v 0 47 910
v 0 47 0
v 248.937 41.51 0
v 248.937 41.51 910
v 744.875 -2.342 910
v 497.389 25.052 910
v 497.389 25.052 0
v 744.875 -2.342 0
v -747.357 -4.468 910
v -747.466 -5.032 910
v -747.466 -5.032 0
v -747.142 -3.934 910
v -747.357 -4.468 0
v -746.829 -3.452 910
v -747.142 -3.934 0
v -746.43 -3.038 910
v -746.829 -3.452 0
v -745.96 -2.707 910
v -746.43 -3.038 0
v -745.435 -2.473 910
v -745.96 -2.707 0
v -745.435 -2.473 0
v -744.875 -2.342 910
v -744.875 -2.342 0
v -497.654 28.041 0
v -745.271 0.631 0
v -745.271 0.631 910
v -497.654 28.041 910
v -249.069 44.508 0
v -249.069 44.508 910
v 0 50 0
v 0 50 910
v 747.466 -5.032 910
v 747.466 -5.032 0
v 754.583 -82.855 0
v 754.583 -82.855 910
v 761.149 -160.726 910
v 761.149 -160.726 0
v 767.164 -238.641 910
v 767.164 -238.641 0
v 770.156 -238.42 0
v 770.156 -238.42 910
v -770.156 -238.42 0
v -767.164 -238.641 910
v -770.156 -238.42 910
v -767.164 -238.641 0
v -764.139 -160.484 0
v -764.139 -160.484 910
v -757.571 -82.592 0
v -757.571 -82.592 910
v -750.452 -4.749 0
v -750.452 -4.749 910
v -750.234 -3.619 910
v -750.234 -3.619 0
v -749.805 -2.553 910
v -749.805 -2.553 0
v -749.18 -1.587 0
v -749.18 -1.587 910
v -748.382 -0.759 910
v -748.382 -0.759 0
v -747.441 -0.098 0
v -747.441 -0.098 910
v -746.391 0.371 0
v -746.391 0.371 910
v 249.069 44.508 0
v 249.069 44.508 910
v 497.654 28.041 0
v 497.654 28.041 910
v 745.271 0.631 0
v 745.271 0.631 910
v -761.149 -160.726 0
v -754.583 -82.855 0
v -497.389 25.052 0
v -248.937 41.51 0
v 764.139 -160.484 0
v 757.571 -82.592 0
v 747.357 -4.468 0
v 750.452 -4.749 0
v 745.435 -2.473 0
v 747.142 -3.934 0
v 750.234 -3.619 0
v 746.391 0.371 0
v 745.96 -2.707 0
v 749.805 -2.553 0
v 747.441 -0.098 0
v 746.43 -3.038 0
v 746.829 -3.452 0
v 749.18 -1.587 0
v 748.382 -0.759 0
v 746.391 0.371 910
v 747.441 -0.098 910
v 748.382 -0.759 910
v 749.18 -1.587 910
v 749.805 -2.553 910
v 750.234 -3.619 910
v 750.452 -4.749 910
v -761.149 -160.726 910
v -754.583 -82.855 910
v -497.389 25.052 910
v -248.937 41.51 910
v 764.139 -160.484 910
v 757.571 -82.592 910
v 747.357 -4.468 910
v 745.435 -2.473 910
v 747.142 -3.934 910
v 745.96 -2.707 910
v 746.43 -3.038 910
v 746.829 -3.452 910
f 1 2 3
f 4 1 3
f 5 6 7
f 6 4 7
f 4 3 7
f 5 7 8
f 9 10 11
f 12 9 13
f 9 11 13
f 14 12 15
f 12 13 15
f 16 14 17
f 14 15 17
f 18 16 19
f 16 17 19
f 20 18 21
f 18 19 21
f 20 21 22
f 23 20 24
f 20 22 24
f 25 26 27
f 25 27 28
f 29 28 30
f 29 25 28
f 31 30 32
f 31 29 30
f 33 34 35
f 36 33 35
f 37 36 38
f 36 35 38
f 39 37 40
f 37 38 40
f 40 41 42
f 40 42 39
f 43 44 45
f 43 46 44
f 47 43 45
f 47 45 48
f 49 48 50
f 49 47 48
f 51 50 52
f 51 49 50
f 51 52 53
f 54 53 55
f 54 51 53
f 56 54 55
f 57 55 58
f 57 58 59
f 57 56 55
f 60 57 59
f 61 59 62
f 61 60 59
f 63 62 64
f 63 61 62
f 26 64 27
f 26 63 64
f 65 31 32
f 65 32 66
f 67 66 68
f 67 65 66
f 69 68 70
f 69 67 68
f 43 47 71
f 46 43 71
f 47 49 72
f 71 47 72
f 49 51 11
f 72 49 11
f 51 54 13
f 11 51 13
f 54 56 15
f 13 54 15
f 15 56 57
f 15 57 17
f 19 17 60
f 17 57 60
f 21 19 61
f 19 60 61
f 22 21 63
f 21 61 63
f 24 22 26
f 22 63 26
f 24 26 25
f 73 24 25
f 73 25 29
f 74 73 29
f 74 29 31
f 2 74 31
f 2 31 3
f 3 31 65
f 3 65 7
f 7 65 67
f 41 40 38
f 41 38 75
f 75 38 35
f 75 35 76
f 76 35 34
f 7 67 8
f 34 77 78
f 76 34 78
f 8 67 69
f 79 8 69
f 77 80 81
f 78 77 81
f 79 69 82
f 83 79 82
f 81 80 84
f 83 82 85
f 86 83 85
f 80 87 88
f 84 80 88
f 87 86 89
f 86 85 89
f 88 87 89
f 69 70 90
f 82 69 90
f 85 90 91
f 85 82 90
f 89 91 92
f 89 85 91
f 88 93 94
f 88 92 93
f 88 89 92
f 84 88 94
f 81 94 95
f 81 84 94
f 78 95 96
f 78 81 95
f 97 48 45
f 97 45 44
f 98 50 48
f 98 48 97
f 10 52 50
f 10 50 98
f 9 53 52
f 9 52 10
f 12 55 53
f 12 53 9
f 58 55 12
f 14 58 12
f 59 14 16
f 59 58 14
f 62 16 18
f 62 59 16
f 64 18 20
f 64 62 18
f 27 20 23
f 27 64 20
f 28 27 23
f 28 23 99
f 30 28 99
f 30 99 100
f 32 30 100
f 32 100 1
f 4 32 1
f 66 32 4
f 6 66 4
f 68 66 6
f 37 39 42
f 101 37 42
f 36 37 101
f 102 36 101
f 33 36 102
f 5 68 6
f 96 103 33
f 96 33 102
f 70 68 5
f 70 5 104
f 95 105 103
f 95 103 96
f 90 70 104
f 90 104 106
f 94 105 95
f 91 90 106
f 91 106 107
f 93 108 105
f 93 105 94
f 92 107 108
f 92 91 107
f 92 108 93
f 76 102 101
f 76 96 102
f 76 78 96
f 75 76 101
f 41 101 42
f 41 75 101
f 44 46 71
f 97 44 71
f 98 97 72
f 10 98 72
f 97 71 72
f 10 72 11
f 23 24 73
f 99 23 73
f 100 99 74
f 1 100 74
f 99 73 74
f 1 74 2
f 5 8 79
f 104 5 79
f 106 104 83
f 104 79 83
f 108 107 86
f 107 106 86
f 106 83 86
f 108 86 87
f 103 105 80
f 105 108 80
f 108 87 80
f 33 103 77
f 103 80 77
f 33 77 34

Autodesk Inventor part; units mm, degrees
ref_plane "YZ Plane" through (0, 0, 0) normal (1, 0, 0) x (0, 1, 0)
ref_plane "XZ Plane" through (0, 0, 0) normal (0, 1, 0) x (-1, 0, 0)
ref_plane "XY Plane" through (0, 0, 0) normal (0, 0, 1) x (1, 0, 0)
sketch "Sketch1" plane through (0, 0, 0) normal (0, 0, 1) x (1, 0, 0)
  line L0 (-750, 0) -> (750, 0) construction
  line L1 (750, 0) -> (750, -2700) construction
  line L2 (750, -2700) -> (-750, -2700) construction
  line L3 (-750, -2700) -> (-750, 0) construction
  line L4 (800, 50) -> (-800, 50) construction
  line L5 (-800, 50) -> (-800, -2750) construction
  line L6 (-800, -2750) -> (800, -2750) construction
  line L7 (800, -2750) -> (800, 50) construction
  line L8 (-850, 100) -> (850, 100) construction
  line L9 (850, 100) -> (850, -2800) construction
  line L10 (850, -2800) -> (-850, -2800) construction
  line L11 (-850, -2800) -> (-850, 100) construction
  arc A0 (750, 0) -> (745.2706, 0.6314) centre (0, -5600) ccw construction
  line L12 (-750, -2100) -> (750, -2100) construction
  line L13 (114.1118, -2698.3696) -> (750, -2100) construction
  arc A1 (750, -2100) -> (770.156, -238.4205) centre (-10250, -1050) ccw construction
  line L14 (750, 0) -> (749.6018, -2.9735) construction
  arc A2 (750, -3.0268) -> (0, 47) centre (-0.2, -5603) ccw construction
  line L15 (750, 0) -> (747.0136, -0.2851) construction
  arc A3 (767.1641, -238.6409) -> (747.4657, -5.0326) centre (-10252.9895, -1050.2527) ccw construction
  arc A4 (750.4522, -4.7486) -> (745.2706, 0.6314) centre (744.4791, -5.3162) ccw
  arc A5 (747.4657, -5.0326) -> (744.8748, -2.3426) centre (744.4792, -5.3164) ccw construction
  line L16 (750, -2100) -> (752.9864, -2100.2851) construction
  arc A6 (752.9864, -2100.2851) -> (771.2831, -213.263) centre (-10246.9891, -1050.0292) ccw construction
  line L17 (750, -2100) -> (752.0559, -2102.1848) construction
  line L18 (752.0559, -2102.1848) -> (752.0559, -2102.1848) construction
  arc A7 (749.1768, -2100.7746) -> (750.1074, -2098.8746) centre (747.1209, -2098.5898) ccw construction
  line L19 (0, -2697) -> (110, -2697) construction
  line L20 (112.0559, -2696.1848) -> (685.3133, -2156.7506) construction
  arc A8 (110, -2700) -> (114.1118, -2698.3696) centre (110, -2694) ccw construction
  arc A9 (110, -2697) -> (112.0559, -2696.1848) centre (110, -2694) ccw construction
  line L21 (685.3133, -2156.7506) -> (687.3692, -2158.9354) construction
  line L22 (752.0559, -2102.1848) -> (671.2185, -2178.2526) construction
  line L23 (671.2185, -2178.2526) -> (669.1626, -2176.0678) construction
  arc A10 (747.4657, -5.0326) -> (747.0136, -0.2851) centre (-10252.9895, -1050.2527) ccw construction
  arc A11 (745.2706, 0.6314) -> (0, 50) centre (0, -5600) ccw
  arc A12 (750.4522, -4.7486) -> (750, 0) centre (-10250, -1050) ccw construction
  line L24 (770.156, -238.4205) -> (767.1641, -238.6409) construction
  line L25 (768.2917, -213.4901) -> (771.2831, -213.263) construction
  arc A13 (770.156, -238.4205) -> (750.4522, -4.7486) centre (-10250, -1050) ccw
  line L26 (0, 100) -> (0, 50) construction
  line L27 (0, -2700) -> (0, -2697) construction
  line L28 (0, 47) -> (0, 0) construction
  line L29 (0, 50) -> (0, 47) construction
  arc A14 (752.0559, -2102.1848) -> (752.9864, -2100.2851) centre (749.9998, -2099.9999) ccw construction
  point P0 (0, -2750)
  dimension "d54" = 1500
  dimension "d55" = 2700
  dimension "d58" = 2100
  dimension "d68" = 6
  dimension "d70" = 3
  dimension "d75" = 3
  dimension "d83" = 6
  dimension "d86" = 3
  dimension "d112" = 239.271
  dimension "d113" = 50
  dimension "d114" = 50
  dimension "d115" = 3
  dimension "d117" = 110
  dimension "d118" = 25
  dimension "d119" = 111
  dimension "d120" = 25
contour flange "Contour Flange2" sketch "Sketch1" thickness 3 bend radius 3 width 910 along (0, 0, 1) mid plane no both sides no wall seen from (760.924, -121.5323, 0) lies toward (-0.9964637, -0.0840242, 0) curves A13 A4 A11
bend "Bend2"
corner "Corner2"
mirror "Mirror2" about plane through (0, 0, 0) normal (1, 0, 0)
equation "\"d36\" = Thickness"
equation "\"d37\" = BendReliefWidth"
equation "\"d38\" = BendReliefDepth"
equation "\"d39\" = MinimumRemnant"
equation "\"d40\" = TransitionRadius"
equation "\"d42\" = BendRadius"
equation "\"d44\" = CornerReliefSize"
equation "\"d45\" = GapSize"
equation "\"d46\" = JacobiRadiusSize"
equation "\"BendRadius\" = Thickness"
equation "\"BendReliefWidth\" = Thickness"
equation "\"BendReliefDepth\" = 0.5 * Thickness"
equation "\"CornerReliefSize\" = 4 * Thickness"
equation "\"MinimumRemnant\" = 2 * Thickness"
equation "\"TransitionRadius\" = BendRadius"
equation "\"JacobiRadiusSize\" = BendRadius"
equation "\"GapSize\" = Thickness"
equation "\"Thickness\" = 3"
properties part number "МОО 032 лист magic back-lowerback" material "Stainless Steel AISI 304"
